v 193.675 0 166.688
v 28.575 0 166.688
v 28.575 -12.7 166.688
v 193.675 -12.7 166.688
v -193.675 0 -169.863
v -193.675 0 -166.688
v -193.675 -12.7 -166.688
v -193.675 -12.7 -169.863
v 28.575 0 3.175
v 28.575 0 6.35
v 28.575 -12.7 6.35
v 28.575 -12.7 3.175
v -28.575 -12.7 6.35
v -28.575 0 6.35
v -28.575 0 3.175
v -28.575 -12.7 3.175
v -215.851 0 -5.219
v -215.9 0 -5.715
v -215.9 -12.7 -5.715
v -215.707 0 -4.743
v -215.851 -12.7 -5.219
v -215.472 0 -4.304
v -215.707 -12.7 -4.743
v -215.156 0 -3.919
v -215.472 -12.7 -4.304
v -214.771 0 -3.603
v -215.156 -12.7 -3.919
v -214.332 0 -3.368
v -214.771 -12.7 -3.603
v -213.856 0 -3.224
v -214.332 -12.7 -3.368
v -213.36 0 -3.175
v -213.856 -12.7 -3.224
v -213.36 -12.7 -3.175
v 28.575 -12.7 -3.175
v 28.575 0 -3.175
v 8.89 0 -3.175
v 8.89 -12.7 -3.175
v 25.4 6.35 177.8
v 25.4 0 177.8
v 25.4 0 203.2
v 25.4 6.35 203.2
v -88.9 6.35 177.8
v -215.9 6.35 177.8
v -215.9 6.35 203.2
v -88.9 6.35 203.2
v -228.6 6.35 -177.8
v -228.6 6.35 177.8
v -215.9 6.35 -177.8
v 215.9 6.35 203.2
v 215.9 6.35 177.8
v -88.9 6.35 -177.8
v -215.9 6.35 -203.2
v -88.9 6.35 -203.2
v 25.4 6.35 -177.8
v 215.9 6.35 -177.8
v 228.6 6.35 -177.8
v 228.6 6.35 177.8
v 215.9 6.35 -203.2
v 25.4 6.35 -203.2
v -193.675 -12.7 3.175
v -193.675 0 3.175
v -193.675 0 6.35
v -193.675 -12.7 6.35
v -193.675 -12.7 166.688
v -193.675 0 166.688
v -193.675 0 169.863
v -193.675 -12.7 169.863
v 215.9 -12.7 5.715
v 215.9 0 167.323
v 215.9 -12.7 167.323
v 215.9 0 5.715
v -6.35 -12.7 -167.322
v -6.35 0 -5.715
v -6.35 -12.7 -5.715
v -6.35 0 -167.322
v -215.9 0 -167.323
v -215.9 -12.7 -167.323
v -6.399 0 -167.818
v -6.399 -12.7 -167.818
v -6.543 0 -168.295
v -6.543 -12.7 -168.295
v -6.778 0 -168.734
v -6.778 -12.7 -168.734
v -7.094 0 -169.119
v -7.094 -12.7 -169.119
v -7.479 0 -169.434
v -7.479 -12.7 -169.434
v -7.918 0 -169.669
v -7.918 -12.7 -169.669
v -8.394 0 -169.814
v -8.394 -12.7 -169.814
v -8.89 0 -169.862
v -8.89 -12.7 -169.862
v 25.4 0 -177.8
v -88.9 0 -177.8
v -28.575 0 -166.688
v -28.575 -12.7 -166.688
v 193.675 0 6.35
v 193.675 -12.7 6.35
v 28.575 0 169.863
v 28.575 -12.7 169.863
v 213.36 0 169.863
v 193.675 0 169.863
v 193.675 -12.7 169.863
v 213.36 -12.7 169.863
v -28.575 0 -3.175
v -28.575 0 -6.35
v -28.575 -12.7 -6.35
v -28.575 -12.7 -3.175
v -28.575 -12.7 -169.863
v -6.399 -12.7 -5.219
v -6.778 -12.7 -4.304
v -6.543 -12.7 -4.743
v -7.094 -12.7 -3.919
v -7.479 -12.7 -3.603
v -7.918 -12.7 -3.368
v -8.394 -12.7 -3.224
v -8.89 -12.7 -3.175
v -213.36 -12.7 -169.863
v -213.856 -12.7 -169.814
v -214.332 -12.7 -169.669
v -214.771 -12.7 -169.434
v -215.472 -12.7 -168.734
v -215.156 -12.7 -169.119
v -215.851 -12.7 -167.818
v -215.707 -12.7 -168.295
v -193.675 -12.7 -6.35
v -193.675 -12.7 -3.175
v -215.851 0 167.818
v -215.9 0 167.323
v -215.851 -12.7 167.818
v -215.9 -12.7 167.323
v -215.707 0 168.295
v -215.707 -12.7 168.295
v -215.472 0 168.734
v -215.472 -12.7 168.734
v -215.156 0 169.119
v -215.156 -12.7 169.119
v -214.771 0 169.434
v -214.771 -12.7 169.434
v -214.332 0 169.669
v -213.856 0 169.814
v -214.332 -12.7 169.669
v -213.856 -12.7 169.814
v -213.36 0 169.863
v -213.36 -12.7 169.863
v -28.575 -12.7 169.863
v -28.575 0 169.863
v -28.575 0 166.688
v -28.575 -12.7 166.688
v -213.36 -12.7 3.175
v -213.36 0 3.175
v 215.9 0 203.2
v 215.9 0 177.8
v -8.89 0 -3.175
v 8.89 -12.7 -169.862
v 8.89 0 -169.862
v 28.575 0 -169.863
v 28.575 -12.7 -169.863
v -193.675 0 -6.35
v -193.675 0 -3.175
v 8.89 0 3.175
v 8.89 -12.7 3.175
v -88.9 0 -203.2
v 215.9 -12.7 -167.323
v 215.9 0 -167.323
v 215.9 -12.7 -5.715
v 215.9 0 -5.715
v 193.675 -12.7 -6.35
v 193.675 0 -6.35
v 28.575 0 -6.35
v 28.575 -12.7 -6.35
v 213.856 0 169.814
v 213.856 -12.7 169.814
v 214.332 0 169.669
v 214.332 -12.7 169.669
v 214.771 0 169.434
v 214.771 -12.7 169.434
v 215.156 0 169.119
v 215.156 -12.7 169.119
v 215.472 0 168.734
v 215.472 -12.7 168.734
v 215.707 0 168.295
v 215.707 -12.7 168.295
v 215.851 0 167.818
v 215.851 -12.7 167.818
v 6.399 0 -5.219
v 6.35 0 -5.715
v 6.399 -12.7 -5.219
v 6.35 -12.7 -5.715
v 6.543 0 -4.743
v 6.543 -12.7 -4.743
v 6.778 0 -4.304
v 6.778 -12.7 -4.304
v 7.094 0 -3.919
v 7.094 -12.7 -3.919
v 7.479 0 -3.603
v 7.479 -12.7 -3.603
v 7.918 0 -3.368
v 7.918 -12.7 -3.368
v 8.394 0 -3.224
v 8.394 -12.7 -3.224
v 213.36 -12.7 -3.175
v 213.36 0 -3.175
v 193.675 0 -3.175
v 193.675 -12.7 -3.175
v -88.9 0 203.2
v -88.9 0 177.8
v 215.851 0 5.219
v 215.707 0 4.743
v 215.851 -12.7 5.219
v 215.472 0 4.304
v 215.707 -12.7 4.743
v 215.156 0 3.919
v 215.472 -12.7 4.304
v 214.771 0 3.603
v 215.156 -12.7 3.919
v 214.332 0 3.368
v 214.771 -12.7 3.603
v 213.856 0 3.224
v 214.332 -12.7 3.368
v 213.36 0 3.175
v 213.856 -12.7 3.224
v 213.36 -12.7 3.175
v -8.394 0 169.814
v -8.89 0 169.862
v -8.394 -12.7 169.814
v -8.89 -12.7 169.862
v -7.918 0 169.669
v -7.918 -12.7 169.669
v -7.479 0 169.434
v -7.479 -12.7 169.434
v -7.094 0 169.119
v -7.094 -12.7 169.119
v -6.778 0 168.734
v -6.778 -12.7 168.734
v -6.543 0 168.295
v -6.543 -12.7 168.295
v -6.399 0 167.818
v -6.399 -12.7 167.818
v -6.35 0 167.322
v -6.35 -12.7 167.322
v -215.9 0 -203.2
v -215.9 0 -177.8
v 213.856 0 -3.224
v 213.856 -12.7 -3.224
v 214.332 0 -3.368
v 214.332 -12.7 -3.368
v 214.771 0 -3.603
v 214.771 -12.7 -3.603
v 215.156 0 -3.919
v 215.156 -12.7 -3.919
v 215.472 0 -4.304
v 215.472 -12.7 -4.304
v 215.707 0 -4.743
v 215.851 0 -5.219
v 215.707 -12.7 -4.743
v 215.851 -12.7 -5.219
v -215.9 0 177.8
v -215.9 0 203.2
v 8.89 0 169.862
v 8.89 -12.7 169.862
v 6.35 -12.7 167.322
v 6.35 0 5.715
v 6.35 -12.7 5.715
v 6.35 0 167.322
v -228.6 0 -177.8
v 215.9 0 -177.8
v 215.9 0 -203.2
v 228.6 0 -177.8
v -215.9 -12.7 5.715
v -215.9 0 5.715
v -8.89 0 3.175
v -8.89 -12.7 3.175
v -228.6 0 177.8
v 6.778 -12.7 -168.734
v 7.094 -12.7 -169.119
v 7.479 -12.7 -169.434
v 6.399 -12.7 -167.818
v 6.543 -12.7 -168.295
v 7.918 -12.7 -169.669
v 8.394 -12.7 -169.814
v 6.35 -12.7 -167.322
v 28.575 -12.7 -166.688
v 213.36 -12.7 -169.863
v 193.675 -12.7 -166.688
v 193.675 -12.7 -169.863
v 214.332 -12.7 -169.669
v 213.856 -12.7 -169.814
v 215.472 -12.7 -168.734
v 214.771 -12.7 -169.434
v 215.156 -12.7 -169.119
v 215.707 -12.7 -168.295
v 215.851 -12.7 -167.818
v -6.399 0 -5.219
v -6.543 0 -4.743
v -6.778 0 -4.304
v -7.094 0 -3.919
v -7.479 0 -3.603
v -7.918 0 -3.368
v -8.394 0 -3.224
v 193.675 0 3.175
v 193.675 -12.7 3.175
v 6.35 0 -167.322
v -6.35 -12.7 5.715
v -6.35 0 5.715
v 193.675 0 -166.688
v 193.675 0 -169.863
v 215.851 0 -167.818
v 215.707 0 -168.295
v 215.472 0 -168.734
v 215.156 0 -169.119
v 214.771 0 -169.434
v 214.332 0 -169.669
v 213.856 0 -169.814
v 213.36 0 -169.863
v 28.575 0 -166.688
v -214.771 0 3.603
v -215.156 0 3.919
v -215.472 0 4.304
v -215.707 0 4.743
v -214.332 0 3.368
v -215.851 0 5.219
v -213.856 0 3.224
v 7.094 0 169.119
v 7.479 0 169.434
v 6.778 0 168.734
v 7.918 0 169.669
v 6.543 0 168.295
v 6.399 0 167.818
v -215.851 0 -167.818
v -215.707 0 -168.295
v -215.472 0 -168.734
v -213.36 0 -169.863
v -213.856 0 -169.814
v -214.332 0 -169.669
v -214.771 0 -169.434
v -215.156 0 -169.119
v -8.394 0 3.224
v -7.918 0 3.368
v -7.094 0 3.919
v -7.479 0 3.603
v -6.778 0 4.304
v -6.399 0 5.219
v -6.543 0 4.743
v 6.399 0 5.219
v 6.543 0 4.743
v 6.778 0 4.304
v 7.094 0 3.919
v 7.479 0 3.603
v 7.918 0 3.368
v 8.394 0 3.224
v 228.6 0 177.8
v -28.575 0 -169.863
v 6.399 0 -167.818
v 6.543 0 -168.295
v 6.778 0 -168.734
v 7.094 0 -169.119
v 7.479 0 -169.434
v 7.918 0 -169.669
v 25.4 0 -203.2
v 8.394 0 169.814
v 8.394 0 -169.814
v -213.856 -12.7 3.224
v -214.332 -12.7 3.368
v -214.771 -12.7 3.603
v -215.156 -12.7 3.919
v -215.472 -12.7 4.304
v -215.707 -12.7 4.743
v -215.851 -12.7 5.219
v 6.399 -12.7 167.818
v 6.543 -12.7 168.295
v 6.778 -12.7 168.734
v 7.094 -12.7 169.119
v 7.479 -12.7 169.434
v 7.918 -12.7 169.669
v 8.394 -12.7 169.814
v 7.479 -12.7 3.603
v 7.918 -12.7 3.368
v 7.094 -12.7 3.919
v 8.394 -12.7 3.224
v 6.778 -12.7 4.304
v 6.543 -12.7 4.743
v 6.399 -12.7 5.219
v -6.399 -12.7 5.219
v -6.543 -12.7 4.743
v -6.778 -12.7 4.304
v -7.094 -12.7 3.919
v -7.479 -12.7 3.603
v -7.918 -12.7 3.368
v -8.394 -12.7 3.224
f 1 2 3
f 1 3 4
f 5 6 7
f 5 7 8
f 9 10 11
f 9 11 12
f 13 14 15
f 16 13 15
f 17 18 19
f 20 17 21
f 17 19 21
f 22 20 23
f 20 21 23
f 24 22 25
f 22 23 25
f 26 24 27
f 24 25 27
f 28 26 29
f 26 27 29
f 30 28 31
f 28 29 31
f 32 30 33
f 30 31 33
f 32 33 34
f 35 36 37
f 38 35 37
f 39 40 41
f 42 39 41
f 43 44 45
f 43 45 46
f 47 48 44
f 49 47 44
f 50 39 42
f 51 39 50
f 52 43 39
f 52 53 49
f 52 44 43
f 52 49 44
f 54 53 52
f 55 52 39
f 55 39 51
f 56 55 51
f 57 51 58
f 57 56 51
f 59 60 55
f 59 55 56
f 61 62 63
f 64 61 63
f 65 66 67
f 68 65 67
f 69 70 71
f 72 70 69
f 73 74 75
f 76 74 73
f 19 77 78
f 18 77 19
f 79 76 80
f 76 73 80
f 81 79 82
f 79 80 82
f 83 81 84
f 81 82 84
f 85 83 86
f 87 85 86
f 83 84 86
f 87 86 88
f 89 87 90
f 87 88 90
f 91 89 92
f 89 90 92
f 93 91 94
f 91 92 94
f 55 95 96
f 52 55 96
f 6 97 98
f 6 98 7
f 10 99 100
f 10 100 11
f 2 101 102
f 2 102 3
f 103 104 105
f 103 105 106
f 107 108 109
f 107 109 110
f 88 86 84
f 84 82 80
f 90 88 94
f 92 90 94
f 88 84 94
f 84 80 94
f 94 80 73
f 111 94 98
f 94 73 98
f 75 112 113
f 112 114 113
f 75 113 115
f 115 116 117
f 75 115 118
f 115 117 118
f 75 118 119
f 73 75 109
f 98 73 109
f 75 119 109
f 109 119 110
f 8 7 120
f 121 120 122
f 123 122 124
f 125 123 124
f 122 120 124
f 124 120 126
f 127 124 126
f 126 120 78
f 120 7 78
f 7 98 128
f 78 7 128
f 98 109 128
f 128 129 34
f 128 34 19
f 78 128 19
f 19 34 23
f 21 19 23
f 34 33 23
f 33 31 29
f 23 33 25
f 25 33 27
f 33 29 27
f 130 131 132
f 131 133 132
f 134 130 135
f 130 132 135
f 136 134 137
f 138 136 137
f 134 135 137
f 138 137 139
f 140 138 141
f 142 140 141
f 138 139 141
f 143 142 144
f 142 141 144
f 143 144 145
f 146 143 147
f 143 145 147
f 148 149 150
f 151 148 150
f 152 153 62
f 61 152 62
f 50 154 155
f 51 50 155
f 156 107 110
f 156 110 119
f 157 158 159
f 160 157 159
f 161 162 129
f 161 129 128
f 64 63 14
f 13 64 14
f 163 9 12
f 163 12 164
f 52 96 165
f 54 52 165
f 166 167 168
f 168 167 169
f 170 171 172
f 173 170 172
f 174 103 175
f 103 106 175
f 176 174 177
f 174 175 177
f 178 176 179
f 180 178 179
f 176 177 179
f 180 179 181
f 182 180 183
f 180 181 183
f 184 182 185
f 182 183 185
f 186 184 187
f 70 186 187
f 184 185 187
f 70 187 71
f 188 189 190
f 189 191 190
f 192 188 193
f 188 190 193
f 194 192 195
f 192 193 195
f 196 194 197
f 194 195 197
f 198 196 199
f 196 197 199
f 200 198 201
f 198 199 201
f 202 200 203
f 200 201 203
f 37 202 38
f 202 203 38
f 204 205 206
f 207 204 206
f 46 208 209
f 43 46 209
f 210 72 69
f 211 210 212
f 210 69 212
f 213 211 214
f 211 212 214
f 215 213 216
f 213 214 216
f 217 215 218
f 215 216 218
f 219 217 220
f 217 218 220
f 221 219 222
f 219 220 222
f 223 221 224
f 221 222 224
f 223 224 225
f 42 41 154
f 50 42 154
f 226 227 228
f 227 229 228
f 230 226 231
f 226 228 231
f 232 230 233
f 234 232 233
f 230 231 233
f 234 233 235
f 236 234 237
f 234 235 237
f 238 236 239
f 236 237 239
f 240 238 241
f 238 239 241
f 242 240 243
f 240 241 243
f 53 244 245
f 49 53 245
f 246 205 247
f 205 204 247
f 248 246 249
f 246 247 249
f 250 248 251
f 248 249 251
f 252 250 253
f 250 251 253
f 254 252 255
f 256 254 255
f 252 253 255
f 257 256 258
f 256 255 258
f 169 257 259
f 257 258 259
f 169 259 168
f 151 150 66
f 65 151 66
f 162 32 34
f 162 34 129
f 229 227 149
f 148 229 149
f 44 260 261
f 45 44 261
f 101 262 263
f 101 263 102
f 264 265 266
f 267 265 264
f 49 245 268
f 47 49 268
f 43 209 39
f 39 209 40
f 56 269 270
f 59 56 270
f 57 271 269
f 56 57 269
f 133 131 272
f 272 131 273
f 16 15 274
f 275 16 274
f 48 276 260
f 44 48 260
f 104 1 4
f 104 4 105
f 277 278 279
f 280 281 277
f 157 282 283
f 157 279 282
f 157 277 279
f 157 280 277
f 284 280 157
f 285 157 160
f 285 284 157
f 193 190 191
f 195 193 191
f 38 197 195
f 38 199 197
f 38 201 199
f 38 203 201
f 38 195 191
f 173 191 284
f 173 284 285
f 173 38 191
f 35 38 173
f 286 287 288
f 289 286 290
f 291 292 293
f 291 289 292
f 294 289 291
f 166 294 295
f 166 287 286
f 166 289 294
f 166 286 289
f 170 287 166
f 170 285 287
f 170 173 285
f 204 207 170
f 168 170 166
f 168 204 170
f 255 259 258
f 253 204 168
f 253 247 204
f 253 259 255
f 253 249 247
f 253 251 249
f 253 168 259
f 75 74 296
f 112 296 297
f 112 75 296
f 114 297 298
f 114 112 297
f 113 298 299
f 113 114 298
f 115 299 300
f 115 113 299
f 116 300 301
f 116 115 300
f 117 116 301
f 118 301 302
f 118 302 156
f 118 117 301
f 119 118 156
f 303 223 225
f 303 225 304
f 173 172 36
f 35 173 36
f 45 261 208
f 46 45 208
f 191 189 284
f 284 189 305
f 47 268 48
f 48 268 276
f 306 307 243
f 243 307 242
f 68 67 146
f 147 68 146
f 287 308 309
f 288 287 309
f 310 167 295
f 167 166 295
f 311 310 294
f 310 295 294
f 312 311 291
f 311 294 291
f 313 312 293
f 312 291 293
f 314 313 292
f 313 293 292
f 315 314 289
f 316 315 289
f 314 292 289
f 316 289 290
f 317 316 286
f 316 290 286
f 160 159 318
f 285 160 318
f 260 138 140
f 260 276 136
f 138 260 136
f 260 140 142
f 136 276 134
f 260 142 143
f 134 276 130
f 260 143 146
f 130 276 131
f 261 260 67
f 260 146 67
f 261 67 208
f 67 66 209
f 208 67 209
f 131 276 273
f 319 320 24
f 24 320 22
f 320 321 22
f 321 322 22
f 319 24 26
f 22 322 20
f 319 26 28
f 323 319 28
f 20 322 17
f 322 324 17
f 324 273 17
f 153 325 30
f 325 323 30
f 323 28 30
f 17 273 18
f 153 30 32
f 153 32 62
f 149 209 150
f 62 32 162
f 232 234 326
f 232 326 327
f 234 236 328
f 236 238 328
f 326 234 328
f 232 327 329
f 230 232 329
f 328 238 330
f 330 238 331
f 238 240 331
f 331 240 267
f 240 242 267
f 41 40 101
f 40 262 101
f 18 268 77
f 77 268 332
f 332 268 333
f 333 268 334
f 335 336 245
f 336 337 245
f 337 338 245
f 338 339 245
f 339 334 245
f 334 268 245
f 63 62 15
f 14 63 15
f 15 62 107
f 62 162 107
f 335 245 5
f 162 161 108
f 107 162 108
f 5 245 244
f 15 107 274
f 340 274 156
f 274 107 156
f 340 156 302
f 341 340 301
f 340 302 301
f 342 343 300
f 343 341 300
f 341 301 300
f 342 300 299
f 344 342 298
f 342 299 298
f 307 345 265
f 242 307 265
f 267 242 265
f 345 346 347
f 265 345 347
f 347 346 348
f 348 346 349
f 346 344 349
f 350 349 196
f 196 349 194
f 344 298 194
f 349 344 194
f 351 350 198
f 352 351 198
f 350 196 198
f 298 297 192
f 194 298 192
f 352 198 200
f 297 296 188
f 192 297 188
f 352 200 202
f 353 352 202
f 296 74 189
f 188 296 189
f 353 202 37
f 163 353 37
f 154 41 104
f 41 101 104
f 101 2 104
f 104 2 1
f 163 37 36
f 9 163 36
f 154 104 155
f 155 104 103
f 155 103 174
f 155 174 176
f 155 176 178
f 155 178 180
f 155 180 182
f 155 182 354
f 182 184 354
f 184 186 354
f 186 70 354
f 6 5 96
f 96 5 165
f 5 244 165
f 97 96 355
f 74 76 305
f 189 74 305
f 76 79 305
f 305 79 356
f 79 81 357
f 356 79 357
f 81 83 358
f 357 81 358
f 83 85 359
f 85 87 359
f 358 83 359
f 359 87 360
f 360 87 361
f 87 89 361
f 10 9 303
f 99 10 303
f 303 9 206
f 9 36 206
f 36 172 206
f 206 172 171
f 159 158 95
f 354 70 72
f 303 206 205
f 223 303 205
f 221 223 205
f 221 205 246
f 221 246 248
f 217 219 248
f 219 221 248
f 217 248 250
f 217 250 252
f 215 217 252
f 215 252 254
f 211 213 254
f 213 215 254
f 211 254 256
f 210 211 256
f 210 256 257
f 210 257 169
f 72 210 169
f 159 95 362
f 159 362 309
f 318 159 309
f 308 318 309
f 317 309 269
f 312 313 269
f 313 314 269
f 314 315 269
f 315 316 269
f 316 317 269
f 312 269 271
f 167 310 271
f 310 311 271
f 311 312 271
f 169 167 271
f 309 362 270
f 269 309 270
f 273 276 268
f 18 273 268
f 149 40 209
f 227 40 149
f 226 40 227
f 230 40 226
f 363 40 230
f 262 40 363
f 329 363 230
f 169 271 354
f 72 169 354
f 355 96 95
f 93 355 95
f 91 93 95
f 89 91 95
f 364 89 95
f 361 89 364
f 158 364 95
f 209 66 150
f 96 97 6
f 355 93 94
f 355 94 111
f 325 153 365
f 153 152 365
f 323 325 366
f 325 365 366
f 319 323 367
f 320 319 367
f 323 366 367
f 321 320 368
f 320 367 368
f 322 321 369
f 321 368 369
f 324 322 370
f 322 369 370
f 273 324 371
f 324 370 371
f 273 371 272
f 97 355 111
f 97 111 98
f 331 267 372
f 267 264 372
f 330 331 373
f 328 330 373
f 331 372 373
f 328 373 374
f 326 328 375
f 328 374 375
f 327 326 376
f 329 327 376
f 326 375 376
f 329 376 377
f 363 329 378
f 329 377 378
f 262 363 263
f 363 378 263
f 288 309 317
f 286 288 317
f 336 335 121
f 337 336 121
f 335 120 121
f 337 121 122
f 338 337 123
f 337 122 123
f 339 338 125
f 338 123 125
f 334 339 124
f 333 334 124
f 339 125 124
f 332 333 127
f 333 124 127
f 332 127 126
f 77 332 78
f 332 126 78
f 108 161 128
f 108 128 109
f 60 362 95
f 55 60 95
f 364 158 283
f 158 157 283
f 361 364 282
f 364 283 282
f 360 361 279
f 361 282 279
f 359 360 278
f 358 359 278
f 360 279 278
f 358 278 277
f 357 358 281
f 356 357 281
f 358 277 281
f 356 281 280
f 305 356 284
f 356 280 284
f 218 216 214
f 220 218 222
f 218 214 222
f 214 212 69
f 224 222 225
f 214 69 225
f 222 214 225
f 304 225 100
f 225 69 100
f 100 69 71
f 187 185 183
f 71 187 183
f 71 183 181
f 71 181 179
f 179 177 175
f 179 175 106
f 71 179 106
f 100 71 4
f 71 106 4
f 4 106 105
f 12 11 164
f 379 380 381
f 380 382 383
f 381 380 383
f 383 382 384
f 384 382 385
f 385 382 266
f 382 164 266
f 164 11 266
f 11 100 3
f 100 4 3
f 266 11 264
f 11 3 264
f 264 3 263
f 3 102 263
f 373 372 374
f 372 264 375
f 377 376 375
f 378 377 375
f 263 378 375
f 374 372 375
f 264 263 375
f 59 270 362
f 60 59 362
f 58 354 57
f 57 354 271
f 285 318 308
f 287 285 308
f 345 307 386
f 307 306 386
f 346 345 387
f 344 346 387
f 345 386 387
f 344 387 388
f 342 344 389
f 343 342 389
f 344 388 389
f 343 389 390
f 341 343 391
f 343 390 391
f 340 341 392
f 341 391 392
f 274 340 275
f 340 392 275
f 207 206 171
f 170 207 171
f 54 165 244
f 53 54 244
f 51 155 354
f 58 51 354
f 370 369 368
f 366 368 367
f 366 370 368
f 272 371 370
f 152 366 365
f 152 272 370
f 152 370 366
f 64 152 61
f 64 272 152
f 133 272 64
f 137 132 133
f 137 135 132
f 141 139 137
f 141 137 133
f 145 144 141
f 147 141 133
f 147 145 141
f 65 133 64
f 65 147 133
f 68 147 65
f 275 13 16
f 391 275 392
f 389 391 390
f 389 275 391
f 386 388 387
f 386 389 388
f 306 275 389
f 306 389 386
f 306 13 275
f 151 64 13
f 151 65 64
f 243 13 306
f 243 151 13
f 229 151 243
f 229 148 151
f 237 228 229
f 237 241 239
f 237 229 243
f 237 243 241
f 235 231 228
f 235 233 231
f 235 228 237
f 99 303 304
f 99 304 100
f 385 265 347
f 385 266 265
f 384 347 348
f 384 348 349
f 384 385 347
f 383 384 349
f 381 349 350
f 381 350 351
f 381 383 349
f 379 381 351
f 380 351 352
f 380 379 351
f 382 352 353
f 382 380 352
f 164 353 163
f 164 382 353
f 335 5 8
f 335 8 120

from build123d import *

# Parameters (mm, degrees)
BOSS_EXTRUDE1_DEPTH = 6.35
BOSS_EXTRUDE2_DEPTH = 12.7
FILLET1_R           = 2.54


with BuildPart() as part:
    # Sketch1 → Boss-Extrude1 (new body)
    with BuildSketch(Plane(origin=(0, 0, 0), x_dir=(1, 0, 0), z_dir=(0, 1, 0))):
        Polygon((-228.6, 177.8), (-228.6, -177.8), (-215.9, -177.8), (-215.9, -203.2), (-88.9, -203.2), (-88.9, -177.8), (25.4, -177.8), (25.4, -203.2), (215.9, -203.2), (215.9, -177.8), (228.6, -177.8), (228.6, 177.8), (215.9, 177.8), (215.9, 203.2), (25.4, 203.2), (25.4, 177.8), (-88.9, 177.8), (-88.9, 203.2), (-215.9, 203.2), (-215.9, 177.8), align=None)
    extrude(amount=BOSS_EXTRUDE1_DEPTH)

    # Sketch2 → Boss-Extrude2 (add)
    with BuildSketch(Plane.XZ):
        Polygon((-193.675, 3.17500545), (-193.675, 6.35000545), (-28.575, 6.35000545), (-28.575, 3.17500545), (-6.35, 3.174999665), (-6.35, 169.862499665), (-28.575, 169.862500389), (-28.575, 166.687500389), (-193.675, 166.687500389), (-193.675, 169.862500389), (-215.9, 169.8625), (-215.9, 3.175), align=None)
        Polygon((-6.35, -3.174999665), (-6.35, -169.862499665), (-28.575, -169.862500389), (-28.575, -166.687500389), (-193.675, -166.687500389), (-193.675, -169.862500389), (-215.9, -169.8625), (-215.9, -3.175), (-193.675, -3.17500545), (-193.675, -6.35000545), (-28.575, -6.35000545), (-28.575, -3.17500545), align=None)
        Polygon((193.675, -3.17500545), (193.675, -6.35000545), (28.575, -6.35000545), (28.575, -3.17500545), (6.35, -3.174999665), (6.35, -169.862499665), (28.575, -169.862500389), (28.575, -166.687500389), (193.675, -166.687500389), (193.675, -169.862500389), (215.9, -169.8625), (215.9, -3.175), align=None)
        Polygon((6.35, 3.174999665), (6.35, 169.862499665), (28.575, 169.862500389), (28.575, 166.687500389), (193.675, 166.687500389), (193.675, 169.862500389), (215.9, 169.8625), (215.9, 3.175), (193.675, 3.17500545), (193.675, 6.35000545), (28.575, 6.35000545), (28.575, 3.17500545), align=None)
    extrude(amount=BOSS_EXTRUDE2_DEPTH)

    # Fillet1
    fillet1_edges = [part.edges().sort_by_distance(p)[0] for p in [
        (215.9, -6.35, -169.8625),
        (215.9, -6.35, -3.175),
        (6.35, -6.35, -3.174999665),
        (6.35, -6.35, -169.862499665),
        (-215.9, -6.35, 169.8625),
        (-215.9, -6.35, 3.175),
        (-6.35, -6.35, 3.174999665),
        (-6.35, -6.35, 169.862499665),
        (215.9, -6.35, 169.8625),
        (6.35, -6.35, 169.862499665),
        (6.35, -6.35, 3.174999665),
        (215.9, -6.35, 3.175),
        (-215.9, -6.35, -169.8625),
        (-6.35, -6.35, -169.862499665),
        (-6.35, -6.35, -3.174999665),
        (-215.9, -6.35, -3.175),
    ]]
    fillet(fillet1_edges, radius=FILLET1_R)


solid = part.part
